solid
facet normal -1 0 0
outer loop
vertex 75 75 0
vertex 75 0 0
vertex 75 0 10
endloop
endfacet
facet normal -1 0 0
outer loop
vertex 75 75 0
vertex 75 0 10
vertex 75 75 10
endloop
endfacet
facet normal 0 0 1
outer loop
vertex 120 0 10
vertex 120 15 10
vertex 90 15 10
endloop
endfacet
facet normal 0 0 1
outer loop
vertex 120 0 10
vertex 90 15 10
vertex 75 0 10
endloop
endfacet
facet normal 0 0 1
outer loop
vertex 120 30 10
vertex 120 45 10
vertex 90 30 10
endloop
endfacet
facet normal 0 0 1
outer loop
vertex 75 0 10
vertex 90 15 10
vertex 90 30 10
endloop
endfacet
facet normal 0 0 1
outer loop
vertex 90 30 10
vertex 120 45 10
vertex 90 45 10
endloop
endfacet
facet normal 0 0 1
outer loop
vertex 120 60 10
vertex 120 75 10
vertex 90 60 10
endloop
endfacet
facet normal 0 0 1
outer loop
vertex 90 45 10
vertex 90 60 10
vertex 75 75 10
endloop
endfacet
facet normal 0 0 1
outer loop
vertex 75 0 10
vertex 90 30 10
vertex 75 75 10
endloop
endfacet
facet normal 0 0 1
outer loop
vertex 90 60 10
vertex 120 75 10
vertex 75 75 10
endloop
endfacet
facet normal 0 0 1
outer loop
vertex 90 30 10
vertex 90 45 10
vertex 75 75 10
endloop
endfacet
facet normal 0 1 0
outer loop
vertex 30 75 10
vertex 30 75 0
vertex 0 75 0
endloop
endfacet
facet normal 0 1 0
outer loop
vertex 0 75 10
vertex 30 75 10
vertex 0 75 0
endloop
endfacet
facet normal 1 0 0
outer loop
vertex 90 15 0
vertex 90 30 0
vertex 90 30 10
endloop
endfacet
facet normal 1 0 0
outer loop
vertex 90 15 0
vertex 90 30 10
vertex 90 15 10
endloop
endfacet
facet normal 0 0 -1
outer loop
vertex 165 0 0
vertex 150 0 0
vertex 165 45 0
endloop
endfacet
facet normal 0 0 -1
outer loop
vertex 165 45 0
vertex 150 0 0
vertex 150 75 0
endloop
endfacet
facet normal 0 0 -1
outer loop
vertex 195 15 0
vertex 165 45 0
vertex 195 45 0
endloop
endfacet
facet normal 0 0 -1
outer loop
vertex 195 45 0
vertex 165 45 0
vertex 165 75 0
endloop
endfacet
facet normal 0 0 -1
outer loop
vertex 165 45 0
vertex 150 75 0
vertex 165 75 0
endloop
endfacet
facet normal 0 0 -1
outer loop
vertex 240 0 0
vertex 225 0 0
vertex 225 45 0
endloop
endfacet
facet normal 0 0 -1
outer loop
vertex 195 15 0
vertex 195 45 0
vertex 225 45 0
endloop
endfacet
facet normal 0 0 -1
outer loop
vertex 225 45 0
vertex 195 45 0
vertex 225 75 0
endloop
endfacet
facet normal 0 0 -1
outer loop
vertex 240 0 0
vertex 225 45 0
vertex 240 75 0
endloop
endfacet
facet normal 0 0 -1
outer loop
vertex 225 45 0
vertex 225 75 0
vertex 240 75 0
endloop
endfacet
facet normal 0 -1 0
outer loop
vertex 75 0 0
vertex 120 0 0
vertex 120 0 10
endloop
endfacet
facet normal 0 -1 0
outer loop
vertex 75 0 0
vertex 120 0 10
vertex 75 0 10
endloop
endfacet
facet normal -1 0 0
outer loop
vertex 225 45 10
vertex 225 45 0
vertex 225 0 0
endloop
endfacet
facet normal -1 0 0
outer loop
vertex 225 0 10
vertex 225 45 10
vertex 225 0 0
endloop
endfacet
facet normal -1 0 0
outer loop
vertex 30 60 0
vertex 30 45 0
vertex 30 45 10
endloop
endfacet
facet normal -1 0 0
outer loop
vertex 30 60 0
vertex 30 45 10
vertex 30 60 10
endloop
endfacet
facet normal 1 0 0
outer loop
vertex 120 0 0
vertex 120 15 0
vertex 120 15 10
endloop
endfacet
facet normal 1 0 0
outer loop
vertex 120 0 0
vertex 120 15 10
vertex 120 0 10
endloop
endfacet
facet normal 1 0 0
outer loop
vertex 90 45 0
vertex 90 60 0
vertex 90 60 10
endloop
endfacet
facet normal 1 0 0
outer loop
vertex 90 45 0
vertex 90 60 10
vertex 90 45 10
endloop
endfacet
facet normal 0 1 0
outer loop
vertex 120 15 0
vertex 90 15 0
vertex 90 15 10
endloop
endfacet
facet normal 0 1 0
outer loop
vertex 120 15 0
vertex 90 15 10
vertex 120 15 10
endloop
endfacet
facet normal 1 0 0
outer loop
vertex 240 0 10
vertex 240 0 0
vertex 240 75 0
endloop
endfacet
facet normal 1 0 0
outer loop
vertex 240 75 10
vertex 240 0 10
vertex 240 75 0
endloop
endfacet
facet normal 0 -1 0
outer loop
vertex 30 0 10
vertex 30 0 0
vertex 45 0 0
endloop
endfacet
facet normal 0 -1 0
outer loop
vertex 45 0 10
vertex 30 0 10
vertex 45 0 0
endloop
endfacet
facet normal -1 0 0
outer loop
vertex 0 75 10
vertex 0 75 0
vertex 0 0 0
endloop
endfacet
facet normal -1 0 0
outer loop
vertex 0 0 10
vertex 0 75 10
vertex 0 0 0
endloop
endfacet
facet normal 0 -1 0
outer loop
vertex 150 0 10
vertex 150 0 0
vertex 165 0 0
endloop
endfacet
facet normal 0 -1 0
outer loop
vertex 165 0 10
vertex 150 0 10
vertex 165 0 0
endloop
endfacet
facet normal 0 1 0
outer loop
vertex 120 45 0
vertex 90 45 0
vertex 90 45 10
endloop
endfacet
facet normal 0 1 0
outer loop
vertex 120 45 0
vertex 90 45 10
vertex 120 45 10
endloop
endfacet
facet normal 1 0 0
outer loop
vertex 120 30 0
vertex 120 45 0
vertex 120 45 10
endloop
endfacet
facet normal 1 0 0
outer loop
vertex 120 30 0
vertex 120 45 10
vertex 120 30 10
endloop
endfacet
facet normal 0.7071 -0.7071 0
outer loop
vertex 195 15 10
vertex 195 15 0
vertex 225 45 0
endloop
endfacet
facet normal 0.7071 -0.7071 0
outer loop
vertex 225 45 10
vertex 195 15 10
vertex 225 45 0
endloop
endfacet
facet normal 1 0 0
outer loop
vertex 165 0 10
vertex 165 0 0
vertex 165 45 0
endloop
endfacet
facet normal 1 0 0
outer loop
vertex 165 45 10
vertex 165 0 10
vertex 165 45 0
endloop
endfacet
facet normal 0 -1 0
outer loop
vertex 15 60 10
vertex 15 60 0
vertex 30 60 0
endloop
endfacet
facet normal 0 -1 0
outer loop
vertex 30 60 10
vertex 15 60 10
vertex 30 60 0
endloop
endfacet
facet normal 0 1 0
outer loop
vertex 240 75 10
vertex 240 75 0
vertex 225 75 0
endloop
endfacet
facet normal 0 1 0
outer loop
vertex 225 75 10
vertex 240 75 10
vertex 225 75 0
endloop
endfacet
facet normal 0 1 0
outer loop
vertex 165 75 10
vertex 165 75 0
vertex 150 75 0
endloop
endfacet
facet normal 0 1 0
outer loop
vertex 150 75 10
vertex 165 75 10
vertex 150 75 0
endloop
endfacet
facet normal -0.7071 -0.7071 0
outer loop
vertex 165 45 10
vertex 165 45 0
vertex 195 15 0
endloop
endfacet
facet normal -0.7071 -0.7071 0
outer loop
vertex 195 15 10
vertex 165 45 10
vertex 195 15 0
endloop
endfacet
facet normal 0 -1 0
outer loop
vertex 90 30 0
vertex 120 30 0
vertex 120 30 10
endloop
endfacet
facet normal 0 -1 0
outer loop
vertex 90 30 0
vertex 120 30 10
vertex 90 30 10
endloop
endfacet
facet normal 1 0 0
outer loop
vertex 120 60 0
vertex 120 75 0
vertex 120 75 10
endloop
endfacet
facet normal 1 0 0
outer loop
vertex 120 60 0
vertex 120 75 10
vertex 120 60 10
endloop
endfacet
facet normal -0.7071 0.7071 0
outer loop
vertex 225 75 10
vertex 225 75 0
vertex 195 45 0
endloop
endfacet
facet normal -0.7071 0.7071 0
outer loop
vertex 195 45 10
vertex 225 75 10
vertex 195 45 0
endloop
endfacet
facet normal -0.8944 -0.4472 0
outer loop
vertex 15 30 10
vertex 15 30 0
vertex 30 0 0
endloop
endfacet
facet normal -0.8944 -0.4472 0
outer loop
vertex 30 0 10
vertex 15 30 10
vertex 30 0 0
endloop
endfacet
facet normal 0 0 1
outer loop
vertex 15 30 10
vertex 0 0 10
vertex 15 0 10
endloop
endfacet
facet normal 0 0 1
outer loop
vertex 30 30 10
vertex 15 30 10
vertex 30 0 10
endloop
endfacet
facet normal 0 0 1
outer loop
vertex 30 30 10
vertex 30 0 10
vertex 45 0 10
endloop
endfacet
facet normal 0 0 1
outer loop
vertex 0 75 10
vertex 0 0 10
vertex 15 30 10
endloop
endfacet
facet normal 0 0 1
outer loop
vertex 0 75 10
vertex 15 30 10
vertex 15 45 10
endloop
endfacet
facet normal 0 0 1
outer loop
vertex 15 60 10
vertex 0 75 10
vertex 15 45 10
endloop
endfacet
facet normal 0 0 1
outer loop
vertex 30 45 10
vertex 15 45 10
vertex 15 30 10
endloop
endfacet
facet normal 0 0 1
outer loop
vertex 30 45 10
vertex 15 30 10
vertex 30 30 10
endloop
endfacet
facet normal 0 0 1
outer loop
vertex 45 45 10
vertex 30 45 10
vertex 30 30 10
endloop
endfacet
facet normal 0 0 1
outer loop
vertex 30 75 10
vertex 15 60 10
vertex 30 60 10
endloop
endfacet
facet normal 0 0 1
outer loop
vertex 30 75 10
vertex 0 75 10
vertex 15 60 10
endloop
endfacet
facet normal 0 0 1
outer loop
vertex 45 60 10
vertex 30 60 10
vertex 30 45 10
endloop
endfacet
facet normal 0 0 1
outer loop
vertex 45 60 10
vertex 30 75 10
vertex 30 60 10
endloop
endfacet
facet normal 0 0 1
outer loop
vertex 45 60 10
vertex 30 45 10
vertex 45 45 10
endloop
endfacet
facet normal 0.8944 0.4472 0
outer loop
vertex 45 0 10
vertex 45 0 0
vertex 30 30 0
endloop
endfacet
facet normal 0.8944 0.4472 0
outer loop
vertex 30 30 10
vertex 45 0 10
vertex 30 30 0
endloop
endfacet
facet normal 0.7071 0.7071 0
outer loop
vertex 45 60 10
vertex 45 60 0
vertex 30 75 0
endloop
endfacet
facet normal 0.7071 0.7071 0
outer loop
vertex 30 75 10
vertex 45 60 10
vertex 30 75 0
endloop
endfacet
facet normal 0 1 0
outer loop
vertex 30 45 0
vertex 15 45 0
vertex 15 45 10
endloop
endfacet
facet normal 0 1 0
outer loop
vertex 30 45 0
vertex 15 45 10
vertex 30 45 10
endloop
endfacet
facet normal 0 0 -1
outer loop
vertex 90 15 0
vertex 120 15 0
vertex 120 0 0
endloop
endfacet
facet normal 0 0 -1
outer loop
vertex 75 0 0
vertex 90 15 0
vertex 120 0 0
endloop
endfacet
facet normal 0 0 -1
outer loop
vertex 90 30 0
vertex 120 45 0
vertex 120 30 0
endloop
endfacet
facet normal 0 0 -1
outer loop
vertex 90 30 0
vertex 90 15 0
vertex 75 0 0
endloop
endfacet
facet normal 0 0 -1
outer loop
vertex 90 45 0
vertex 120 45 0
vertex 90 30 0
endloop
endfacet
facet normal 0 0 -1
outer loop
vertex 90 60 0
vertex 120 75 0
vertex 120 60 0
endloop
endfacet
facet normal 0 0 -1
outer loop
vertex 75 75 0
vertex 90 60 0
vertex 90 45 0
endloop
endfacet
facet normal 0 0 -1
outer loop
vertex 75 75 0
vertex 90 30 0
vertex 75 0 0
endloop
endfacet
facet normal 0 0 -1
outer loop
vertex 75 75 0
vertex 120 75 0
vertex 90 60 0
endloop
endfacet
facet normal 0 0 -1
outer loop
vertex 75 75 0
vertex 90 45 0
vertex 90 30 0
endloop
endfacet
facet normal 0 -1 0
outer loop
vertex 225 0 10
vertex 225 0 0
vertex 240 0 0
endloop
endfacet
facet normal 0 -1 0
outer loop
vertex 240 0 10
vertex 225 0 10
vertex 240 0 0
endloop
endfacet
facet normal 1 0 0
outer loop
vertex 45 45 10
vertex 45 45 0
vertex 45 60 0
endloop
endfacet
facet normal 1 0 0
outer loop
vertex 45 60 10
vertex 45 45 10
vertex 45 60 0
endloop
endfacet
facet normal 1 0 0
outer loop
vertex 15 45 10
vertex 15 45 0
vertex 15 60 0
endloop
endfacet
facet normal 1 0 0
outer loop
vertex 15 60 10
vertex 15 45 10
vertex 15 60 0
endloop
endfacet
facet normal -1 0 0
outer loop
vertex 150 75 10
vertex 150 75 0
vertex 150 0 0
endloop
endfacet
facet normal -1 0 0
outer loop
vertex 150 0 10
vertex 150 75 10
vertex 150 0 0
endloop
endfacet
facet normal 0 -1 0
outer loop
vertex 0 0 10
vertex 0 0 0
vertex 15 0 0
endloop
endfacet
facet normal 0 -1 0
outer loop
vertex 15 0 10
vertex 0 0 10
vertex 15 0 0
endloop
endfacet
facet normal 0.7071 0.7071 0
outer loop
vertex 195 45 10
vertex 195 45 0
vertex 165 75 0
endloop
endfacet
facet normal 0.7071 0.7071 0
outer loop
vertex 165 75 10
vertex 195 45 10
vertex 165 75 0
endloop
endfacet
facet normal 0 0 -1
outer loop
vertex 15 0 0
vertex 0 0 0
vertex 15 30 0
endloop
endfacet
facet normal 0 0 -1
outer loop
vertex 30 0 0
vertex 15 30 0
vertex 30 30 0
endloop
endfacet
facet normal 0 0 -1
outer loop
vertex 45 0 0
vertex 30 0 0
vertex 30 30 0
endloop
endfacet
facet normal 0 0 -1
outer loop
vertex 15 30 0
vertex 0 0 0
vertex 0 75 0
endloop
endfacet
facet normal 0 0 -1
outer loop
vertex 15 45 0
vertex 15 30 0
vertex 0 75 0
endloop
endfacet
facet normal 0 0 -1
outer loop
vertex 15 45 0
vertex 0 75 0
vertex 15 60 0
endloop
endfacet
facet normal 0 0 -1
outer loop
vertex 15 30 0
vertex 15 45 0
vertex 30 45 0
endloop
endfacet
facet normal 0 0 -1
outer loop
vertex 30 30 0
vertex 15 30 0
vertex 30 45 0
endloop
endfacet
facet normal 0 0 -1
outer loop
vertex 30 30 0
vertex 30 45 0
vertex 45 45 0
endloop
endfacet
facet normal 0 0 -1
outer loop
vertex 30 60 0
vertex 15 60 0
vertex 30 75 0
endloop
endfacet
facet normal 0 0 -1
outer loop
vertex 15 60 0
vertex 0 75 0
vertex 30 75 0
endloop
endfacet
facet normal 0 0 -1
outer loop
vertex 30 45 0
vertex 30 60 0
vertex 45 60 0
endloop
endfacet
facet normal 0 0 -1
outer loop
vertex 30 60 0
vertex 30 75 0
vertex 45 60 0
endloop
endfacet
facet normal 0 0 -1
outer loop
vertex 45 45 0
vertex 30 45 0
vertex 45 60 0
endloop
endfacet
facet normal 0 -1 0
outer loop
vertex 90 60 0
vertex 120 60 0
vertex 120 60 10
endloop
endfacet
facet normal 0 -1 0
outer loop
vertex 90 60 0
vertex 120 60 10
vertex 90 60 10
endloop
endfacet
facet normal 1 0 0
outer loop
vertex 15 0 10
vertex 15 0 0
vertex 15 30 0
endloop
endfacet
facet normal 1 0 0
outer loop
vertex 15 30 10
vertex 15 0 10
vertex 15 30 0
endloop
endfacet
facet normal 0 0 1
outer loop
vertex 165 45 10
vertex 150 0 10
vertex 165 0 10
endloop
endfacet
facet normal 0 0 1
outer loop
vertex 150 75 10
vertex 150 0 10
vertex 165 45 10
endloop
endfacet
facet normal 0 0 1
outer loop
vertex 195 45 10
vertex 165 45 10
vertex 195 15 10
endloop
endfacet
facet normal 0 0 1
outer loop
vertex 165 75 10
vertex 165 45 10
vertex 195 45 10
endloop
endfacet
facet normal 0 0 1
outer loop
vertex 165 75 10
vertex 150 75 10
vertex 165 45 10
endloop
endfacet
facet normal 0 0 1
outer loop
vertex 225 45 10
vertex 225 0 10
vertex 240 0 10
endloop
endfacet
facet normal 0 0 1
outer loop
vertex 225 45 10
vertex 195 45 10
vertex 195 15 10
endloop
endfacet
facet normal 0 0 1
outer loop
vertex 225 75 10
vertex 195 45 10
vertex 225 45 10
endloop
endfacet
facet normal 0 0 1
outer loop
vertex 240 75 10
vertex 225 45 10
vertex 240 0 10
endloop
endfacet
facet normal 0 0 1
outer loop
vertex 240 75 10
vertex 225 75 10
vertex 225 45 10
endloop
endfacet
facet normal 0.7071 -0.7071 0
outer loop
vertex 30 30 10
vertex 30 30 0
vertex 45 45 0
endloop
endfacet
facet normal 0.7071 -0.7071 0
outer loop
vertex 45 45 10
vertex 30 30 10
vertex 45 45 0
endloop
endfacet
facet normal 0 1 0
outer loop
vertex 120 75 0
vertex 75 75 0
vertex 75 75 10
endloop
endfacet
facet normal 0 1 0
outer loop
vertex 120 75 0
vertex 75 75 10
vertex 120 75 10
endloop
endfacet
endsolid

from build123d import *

# Parameters (mm, degrees)
SKETCH1_W        = 15
SKETCH1_H        = 15
EXTRUDE1_DEPTH   = 10
EXTRUDE1_2_DEPTH = 10
EXTRUDE1_3_DEPTH = 10


with BuildPart() as part:
    # Sketch1 → Extrude1 (new body)
    with BuildSketch(Plane.XY):
        Polygon((15, 0), (15, 30), (30, 0), (45, 0), (30, 30), (45, 45), (45, 60), (30, 75), (0, 75), (0, 0), align=None)
        with Locations((22.5, 52.5)):
            Rectangle(SKETCH1_W, SKETCH1_H, mode=Mode.SUBTRACT)
    extrude(amount=EXTRUDE1_DEPTH)


with BuildPart() as body_2:
    # Sketch1 → Extrude1 2 (new body)
    with BuildSketch(Plane.XY):
        Polygon((240, 0), (240, 75), (225, 75), (195, 45), (165, 75), (150, 75), (150, 0), (165, 0), (165, 45), (195, 15), (225, 45), (225, 0), align=None)
    extrude(amount=EXTRUDE1_2_DEPTH)


with BuildPart() as body_3:
    # Sketch1 → Extrude1 3 (new body)
    with BuildSketch(Plane.XY):
        Polygon((75, 0), (75, 75), (120, 75), (120, 60), (90, 60), (90, 45), (120, 45), (120, 30), (90, 30), (90, 15), (120, 15), (120, 0), align=None)
    extrude(amount=EXTRUDE1_3_DEPTH)


solid = Compound([part.part, body_2.part, body_3.part])
